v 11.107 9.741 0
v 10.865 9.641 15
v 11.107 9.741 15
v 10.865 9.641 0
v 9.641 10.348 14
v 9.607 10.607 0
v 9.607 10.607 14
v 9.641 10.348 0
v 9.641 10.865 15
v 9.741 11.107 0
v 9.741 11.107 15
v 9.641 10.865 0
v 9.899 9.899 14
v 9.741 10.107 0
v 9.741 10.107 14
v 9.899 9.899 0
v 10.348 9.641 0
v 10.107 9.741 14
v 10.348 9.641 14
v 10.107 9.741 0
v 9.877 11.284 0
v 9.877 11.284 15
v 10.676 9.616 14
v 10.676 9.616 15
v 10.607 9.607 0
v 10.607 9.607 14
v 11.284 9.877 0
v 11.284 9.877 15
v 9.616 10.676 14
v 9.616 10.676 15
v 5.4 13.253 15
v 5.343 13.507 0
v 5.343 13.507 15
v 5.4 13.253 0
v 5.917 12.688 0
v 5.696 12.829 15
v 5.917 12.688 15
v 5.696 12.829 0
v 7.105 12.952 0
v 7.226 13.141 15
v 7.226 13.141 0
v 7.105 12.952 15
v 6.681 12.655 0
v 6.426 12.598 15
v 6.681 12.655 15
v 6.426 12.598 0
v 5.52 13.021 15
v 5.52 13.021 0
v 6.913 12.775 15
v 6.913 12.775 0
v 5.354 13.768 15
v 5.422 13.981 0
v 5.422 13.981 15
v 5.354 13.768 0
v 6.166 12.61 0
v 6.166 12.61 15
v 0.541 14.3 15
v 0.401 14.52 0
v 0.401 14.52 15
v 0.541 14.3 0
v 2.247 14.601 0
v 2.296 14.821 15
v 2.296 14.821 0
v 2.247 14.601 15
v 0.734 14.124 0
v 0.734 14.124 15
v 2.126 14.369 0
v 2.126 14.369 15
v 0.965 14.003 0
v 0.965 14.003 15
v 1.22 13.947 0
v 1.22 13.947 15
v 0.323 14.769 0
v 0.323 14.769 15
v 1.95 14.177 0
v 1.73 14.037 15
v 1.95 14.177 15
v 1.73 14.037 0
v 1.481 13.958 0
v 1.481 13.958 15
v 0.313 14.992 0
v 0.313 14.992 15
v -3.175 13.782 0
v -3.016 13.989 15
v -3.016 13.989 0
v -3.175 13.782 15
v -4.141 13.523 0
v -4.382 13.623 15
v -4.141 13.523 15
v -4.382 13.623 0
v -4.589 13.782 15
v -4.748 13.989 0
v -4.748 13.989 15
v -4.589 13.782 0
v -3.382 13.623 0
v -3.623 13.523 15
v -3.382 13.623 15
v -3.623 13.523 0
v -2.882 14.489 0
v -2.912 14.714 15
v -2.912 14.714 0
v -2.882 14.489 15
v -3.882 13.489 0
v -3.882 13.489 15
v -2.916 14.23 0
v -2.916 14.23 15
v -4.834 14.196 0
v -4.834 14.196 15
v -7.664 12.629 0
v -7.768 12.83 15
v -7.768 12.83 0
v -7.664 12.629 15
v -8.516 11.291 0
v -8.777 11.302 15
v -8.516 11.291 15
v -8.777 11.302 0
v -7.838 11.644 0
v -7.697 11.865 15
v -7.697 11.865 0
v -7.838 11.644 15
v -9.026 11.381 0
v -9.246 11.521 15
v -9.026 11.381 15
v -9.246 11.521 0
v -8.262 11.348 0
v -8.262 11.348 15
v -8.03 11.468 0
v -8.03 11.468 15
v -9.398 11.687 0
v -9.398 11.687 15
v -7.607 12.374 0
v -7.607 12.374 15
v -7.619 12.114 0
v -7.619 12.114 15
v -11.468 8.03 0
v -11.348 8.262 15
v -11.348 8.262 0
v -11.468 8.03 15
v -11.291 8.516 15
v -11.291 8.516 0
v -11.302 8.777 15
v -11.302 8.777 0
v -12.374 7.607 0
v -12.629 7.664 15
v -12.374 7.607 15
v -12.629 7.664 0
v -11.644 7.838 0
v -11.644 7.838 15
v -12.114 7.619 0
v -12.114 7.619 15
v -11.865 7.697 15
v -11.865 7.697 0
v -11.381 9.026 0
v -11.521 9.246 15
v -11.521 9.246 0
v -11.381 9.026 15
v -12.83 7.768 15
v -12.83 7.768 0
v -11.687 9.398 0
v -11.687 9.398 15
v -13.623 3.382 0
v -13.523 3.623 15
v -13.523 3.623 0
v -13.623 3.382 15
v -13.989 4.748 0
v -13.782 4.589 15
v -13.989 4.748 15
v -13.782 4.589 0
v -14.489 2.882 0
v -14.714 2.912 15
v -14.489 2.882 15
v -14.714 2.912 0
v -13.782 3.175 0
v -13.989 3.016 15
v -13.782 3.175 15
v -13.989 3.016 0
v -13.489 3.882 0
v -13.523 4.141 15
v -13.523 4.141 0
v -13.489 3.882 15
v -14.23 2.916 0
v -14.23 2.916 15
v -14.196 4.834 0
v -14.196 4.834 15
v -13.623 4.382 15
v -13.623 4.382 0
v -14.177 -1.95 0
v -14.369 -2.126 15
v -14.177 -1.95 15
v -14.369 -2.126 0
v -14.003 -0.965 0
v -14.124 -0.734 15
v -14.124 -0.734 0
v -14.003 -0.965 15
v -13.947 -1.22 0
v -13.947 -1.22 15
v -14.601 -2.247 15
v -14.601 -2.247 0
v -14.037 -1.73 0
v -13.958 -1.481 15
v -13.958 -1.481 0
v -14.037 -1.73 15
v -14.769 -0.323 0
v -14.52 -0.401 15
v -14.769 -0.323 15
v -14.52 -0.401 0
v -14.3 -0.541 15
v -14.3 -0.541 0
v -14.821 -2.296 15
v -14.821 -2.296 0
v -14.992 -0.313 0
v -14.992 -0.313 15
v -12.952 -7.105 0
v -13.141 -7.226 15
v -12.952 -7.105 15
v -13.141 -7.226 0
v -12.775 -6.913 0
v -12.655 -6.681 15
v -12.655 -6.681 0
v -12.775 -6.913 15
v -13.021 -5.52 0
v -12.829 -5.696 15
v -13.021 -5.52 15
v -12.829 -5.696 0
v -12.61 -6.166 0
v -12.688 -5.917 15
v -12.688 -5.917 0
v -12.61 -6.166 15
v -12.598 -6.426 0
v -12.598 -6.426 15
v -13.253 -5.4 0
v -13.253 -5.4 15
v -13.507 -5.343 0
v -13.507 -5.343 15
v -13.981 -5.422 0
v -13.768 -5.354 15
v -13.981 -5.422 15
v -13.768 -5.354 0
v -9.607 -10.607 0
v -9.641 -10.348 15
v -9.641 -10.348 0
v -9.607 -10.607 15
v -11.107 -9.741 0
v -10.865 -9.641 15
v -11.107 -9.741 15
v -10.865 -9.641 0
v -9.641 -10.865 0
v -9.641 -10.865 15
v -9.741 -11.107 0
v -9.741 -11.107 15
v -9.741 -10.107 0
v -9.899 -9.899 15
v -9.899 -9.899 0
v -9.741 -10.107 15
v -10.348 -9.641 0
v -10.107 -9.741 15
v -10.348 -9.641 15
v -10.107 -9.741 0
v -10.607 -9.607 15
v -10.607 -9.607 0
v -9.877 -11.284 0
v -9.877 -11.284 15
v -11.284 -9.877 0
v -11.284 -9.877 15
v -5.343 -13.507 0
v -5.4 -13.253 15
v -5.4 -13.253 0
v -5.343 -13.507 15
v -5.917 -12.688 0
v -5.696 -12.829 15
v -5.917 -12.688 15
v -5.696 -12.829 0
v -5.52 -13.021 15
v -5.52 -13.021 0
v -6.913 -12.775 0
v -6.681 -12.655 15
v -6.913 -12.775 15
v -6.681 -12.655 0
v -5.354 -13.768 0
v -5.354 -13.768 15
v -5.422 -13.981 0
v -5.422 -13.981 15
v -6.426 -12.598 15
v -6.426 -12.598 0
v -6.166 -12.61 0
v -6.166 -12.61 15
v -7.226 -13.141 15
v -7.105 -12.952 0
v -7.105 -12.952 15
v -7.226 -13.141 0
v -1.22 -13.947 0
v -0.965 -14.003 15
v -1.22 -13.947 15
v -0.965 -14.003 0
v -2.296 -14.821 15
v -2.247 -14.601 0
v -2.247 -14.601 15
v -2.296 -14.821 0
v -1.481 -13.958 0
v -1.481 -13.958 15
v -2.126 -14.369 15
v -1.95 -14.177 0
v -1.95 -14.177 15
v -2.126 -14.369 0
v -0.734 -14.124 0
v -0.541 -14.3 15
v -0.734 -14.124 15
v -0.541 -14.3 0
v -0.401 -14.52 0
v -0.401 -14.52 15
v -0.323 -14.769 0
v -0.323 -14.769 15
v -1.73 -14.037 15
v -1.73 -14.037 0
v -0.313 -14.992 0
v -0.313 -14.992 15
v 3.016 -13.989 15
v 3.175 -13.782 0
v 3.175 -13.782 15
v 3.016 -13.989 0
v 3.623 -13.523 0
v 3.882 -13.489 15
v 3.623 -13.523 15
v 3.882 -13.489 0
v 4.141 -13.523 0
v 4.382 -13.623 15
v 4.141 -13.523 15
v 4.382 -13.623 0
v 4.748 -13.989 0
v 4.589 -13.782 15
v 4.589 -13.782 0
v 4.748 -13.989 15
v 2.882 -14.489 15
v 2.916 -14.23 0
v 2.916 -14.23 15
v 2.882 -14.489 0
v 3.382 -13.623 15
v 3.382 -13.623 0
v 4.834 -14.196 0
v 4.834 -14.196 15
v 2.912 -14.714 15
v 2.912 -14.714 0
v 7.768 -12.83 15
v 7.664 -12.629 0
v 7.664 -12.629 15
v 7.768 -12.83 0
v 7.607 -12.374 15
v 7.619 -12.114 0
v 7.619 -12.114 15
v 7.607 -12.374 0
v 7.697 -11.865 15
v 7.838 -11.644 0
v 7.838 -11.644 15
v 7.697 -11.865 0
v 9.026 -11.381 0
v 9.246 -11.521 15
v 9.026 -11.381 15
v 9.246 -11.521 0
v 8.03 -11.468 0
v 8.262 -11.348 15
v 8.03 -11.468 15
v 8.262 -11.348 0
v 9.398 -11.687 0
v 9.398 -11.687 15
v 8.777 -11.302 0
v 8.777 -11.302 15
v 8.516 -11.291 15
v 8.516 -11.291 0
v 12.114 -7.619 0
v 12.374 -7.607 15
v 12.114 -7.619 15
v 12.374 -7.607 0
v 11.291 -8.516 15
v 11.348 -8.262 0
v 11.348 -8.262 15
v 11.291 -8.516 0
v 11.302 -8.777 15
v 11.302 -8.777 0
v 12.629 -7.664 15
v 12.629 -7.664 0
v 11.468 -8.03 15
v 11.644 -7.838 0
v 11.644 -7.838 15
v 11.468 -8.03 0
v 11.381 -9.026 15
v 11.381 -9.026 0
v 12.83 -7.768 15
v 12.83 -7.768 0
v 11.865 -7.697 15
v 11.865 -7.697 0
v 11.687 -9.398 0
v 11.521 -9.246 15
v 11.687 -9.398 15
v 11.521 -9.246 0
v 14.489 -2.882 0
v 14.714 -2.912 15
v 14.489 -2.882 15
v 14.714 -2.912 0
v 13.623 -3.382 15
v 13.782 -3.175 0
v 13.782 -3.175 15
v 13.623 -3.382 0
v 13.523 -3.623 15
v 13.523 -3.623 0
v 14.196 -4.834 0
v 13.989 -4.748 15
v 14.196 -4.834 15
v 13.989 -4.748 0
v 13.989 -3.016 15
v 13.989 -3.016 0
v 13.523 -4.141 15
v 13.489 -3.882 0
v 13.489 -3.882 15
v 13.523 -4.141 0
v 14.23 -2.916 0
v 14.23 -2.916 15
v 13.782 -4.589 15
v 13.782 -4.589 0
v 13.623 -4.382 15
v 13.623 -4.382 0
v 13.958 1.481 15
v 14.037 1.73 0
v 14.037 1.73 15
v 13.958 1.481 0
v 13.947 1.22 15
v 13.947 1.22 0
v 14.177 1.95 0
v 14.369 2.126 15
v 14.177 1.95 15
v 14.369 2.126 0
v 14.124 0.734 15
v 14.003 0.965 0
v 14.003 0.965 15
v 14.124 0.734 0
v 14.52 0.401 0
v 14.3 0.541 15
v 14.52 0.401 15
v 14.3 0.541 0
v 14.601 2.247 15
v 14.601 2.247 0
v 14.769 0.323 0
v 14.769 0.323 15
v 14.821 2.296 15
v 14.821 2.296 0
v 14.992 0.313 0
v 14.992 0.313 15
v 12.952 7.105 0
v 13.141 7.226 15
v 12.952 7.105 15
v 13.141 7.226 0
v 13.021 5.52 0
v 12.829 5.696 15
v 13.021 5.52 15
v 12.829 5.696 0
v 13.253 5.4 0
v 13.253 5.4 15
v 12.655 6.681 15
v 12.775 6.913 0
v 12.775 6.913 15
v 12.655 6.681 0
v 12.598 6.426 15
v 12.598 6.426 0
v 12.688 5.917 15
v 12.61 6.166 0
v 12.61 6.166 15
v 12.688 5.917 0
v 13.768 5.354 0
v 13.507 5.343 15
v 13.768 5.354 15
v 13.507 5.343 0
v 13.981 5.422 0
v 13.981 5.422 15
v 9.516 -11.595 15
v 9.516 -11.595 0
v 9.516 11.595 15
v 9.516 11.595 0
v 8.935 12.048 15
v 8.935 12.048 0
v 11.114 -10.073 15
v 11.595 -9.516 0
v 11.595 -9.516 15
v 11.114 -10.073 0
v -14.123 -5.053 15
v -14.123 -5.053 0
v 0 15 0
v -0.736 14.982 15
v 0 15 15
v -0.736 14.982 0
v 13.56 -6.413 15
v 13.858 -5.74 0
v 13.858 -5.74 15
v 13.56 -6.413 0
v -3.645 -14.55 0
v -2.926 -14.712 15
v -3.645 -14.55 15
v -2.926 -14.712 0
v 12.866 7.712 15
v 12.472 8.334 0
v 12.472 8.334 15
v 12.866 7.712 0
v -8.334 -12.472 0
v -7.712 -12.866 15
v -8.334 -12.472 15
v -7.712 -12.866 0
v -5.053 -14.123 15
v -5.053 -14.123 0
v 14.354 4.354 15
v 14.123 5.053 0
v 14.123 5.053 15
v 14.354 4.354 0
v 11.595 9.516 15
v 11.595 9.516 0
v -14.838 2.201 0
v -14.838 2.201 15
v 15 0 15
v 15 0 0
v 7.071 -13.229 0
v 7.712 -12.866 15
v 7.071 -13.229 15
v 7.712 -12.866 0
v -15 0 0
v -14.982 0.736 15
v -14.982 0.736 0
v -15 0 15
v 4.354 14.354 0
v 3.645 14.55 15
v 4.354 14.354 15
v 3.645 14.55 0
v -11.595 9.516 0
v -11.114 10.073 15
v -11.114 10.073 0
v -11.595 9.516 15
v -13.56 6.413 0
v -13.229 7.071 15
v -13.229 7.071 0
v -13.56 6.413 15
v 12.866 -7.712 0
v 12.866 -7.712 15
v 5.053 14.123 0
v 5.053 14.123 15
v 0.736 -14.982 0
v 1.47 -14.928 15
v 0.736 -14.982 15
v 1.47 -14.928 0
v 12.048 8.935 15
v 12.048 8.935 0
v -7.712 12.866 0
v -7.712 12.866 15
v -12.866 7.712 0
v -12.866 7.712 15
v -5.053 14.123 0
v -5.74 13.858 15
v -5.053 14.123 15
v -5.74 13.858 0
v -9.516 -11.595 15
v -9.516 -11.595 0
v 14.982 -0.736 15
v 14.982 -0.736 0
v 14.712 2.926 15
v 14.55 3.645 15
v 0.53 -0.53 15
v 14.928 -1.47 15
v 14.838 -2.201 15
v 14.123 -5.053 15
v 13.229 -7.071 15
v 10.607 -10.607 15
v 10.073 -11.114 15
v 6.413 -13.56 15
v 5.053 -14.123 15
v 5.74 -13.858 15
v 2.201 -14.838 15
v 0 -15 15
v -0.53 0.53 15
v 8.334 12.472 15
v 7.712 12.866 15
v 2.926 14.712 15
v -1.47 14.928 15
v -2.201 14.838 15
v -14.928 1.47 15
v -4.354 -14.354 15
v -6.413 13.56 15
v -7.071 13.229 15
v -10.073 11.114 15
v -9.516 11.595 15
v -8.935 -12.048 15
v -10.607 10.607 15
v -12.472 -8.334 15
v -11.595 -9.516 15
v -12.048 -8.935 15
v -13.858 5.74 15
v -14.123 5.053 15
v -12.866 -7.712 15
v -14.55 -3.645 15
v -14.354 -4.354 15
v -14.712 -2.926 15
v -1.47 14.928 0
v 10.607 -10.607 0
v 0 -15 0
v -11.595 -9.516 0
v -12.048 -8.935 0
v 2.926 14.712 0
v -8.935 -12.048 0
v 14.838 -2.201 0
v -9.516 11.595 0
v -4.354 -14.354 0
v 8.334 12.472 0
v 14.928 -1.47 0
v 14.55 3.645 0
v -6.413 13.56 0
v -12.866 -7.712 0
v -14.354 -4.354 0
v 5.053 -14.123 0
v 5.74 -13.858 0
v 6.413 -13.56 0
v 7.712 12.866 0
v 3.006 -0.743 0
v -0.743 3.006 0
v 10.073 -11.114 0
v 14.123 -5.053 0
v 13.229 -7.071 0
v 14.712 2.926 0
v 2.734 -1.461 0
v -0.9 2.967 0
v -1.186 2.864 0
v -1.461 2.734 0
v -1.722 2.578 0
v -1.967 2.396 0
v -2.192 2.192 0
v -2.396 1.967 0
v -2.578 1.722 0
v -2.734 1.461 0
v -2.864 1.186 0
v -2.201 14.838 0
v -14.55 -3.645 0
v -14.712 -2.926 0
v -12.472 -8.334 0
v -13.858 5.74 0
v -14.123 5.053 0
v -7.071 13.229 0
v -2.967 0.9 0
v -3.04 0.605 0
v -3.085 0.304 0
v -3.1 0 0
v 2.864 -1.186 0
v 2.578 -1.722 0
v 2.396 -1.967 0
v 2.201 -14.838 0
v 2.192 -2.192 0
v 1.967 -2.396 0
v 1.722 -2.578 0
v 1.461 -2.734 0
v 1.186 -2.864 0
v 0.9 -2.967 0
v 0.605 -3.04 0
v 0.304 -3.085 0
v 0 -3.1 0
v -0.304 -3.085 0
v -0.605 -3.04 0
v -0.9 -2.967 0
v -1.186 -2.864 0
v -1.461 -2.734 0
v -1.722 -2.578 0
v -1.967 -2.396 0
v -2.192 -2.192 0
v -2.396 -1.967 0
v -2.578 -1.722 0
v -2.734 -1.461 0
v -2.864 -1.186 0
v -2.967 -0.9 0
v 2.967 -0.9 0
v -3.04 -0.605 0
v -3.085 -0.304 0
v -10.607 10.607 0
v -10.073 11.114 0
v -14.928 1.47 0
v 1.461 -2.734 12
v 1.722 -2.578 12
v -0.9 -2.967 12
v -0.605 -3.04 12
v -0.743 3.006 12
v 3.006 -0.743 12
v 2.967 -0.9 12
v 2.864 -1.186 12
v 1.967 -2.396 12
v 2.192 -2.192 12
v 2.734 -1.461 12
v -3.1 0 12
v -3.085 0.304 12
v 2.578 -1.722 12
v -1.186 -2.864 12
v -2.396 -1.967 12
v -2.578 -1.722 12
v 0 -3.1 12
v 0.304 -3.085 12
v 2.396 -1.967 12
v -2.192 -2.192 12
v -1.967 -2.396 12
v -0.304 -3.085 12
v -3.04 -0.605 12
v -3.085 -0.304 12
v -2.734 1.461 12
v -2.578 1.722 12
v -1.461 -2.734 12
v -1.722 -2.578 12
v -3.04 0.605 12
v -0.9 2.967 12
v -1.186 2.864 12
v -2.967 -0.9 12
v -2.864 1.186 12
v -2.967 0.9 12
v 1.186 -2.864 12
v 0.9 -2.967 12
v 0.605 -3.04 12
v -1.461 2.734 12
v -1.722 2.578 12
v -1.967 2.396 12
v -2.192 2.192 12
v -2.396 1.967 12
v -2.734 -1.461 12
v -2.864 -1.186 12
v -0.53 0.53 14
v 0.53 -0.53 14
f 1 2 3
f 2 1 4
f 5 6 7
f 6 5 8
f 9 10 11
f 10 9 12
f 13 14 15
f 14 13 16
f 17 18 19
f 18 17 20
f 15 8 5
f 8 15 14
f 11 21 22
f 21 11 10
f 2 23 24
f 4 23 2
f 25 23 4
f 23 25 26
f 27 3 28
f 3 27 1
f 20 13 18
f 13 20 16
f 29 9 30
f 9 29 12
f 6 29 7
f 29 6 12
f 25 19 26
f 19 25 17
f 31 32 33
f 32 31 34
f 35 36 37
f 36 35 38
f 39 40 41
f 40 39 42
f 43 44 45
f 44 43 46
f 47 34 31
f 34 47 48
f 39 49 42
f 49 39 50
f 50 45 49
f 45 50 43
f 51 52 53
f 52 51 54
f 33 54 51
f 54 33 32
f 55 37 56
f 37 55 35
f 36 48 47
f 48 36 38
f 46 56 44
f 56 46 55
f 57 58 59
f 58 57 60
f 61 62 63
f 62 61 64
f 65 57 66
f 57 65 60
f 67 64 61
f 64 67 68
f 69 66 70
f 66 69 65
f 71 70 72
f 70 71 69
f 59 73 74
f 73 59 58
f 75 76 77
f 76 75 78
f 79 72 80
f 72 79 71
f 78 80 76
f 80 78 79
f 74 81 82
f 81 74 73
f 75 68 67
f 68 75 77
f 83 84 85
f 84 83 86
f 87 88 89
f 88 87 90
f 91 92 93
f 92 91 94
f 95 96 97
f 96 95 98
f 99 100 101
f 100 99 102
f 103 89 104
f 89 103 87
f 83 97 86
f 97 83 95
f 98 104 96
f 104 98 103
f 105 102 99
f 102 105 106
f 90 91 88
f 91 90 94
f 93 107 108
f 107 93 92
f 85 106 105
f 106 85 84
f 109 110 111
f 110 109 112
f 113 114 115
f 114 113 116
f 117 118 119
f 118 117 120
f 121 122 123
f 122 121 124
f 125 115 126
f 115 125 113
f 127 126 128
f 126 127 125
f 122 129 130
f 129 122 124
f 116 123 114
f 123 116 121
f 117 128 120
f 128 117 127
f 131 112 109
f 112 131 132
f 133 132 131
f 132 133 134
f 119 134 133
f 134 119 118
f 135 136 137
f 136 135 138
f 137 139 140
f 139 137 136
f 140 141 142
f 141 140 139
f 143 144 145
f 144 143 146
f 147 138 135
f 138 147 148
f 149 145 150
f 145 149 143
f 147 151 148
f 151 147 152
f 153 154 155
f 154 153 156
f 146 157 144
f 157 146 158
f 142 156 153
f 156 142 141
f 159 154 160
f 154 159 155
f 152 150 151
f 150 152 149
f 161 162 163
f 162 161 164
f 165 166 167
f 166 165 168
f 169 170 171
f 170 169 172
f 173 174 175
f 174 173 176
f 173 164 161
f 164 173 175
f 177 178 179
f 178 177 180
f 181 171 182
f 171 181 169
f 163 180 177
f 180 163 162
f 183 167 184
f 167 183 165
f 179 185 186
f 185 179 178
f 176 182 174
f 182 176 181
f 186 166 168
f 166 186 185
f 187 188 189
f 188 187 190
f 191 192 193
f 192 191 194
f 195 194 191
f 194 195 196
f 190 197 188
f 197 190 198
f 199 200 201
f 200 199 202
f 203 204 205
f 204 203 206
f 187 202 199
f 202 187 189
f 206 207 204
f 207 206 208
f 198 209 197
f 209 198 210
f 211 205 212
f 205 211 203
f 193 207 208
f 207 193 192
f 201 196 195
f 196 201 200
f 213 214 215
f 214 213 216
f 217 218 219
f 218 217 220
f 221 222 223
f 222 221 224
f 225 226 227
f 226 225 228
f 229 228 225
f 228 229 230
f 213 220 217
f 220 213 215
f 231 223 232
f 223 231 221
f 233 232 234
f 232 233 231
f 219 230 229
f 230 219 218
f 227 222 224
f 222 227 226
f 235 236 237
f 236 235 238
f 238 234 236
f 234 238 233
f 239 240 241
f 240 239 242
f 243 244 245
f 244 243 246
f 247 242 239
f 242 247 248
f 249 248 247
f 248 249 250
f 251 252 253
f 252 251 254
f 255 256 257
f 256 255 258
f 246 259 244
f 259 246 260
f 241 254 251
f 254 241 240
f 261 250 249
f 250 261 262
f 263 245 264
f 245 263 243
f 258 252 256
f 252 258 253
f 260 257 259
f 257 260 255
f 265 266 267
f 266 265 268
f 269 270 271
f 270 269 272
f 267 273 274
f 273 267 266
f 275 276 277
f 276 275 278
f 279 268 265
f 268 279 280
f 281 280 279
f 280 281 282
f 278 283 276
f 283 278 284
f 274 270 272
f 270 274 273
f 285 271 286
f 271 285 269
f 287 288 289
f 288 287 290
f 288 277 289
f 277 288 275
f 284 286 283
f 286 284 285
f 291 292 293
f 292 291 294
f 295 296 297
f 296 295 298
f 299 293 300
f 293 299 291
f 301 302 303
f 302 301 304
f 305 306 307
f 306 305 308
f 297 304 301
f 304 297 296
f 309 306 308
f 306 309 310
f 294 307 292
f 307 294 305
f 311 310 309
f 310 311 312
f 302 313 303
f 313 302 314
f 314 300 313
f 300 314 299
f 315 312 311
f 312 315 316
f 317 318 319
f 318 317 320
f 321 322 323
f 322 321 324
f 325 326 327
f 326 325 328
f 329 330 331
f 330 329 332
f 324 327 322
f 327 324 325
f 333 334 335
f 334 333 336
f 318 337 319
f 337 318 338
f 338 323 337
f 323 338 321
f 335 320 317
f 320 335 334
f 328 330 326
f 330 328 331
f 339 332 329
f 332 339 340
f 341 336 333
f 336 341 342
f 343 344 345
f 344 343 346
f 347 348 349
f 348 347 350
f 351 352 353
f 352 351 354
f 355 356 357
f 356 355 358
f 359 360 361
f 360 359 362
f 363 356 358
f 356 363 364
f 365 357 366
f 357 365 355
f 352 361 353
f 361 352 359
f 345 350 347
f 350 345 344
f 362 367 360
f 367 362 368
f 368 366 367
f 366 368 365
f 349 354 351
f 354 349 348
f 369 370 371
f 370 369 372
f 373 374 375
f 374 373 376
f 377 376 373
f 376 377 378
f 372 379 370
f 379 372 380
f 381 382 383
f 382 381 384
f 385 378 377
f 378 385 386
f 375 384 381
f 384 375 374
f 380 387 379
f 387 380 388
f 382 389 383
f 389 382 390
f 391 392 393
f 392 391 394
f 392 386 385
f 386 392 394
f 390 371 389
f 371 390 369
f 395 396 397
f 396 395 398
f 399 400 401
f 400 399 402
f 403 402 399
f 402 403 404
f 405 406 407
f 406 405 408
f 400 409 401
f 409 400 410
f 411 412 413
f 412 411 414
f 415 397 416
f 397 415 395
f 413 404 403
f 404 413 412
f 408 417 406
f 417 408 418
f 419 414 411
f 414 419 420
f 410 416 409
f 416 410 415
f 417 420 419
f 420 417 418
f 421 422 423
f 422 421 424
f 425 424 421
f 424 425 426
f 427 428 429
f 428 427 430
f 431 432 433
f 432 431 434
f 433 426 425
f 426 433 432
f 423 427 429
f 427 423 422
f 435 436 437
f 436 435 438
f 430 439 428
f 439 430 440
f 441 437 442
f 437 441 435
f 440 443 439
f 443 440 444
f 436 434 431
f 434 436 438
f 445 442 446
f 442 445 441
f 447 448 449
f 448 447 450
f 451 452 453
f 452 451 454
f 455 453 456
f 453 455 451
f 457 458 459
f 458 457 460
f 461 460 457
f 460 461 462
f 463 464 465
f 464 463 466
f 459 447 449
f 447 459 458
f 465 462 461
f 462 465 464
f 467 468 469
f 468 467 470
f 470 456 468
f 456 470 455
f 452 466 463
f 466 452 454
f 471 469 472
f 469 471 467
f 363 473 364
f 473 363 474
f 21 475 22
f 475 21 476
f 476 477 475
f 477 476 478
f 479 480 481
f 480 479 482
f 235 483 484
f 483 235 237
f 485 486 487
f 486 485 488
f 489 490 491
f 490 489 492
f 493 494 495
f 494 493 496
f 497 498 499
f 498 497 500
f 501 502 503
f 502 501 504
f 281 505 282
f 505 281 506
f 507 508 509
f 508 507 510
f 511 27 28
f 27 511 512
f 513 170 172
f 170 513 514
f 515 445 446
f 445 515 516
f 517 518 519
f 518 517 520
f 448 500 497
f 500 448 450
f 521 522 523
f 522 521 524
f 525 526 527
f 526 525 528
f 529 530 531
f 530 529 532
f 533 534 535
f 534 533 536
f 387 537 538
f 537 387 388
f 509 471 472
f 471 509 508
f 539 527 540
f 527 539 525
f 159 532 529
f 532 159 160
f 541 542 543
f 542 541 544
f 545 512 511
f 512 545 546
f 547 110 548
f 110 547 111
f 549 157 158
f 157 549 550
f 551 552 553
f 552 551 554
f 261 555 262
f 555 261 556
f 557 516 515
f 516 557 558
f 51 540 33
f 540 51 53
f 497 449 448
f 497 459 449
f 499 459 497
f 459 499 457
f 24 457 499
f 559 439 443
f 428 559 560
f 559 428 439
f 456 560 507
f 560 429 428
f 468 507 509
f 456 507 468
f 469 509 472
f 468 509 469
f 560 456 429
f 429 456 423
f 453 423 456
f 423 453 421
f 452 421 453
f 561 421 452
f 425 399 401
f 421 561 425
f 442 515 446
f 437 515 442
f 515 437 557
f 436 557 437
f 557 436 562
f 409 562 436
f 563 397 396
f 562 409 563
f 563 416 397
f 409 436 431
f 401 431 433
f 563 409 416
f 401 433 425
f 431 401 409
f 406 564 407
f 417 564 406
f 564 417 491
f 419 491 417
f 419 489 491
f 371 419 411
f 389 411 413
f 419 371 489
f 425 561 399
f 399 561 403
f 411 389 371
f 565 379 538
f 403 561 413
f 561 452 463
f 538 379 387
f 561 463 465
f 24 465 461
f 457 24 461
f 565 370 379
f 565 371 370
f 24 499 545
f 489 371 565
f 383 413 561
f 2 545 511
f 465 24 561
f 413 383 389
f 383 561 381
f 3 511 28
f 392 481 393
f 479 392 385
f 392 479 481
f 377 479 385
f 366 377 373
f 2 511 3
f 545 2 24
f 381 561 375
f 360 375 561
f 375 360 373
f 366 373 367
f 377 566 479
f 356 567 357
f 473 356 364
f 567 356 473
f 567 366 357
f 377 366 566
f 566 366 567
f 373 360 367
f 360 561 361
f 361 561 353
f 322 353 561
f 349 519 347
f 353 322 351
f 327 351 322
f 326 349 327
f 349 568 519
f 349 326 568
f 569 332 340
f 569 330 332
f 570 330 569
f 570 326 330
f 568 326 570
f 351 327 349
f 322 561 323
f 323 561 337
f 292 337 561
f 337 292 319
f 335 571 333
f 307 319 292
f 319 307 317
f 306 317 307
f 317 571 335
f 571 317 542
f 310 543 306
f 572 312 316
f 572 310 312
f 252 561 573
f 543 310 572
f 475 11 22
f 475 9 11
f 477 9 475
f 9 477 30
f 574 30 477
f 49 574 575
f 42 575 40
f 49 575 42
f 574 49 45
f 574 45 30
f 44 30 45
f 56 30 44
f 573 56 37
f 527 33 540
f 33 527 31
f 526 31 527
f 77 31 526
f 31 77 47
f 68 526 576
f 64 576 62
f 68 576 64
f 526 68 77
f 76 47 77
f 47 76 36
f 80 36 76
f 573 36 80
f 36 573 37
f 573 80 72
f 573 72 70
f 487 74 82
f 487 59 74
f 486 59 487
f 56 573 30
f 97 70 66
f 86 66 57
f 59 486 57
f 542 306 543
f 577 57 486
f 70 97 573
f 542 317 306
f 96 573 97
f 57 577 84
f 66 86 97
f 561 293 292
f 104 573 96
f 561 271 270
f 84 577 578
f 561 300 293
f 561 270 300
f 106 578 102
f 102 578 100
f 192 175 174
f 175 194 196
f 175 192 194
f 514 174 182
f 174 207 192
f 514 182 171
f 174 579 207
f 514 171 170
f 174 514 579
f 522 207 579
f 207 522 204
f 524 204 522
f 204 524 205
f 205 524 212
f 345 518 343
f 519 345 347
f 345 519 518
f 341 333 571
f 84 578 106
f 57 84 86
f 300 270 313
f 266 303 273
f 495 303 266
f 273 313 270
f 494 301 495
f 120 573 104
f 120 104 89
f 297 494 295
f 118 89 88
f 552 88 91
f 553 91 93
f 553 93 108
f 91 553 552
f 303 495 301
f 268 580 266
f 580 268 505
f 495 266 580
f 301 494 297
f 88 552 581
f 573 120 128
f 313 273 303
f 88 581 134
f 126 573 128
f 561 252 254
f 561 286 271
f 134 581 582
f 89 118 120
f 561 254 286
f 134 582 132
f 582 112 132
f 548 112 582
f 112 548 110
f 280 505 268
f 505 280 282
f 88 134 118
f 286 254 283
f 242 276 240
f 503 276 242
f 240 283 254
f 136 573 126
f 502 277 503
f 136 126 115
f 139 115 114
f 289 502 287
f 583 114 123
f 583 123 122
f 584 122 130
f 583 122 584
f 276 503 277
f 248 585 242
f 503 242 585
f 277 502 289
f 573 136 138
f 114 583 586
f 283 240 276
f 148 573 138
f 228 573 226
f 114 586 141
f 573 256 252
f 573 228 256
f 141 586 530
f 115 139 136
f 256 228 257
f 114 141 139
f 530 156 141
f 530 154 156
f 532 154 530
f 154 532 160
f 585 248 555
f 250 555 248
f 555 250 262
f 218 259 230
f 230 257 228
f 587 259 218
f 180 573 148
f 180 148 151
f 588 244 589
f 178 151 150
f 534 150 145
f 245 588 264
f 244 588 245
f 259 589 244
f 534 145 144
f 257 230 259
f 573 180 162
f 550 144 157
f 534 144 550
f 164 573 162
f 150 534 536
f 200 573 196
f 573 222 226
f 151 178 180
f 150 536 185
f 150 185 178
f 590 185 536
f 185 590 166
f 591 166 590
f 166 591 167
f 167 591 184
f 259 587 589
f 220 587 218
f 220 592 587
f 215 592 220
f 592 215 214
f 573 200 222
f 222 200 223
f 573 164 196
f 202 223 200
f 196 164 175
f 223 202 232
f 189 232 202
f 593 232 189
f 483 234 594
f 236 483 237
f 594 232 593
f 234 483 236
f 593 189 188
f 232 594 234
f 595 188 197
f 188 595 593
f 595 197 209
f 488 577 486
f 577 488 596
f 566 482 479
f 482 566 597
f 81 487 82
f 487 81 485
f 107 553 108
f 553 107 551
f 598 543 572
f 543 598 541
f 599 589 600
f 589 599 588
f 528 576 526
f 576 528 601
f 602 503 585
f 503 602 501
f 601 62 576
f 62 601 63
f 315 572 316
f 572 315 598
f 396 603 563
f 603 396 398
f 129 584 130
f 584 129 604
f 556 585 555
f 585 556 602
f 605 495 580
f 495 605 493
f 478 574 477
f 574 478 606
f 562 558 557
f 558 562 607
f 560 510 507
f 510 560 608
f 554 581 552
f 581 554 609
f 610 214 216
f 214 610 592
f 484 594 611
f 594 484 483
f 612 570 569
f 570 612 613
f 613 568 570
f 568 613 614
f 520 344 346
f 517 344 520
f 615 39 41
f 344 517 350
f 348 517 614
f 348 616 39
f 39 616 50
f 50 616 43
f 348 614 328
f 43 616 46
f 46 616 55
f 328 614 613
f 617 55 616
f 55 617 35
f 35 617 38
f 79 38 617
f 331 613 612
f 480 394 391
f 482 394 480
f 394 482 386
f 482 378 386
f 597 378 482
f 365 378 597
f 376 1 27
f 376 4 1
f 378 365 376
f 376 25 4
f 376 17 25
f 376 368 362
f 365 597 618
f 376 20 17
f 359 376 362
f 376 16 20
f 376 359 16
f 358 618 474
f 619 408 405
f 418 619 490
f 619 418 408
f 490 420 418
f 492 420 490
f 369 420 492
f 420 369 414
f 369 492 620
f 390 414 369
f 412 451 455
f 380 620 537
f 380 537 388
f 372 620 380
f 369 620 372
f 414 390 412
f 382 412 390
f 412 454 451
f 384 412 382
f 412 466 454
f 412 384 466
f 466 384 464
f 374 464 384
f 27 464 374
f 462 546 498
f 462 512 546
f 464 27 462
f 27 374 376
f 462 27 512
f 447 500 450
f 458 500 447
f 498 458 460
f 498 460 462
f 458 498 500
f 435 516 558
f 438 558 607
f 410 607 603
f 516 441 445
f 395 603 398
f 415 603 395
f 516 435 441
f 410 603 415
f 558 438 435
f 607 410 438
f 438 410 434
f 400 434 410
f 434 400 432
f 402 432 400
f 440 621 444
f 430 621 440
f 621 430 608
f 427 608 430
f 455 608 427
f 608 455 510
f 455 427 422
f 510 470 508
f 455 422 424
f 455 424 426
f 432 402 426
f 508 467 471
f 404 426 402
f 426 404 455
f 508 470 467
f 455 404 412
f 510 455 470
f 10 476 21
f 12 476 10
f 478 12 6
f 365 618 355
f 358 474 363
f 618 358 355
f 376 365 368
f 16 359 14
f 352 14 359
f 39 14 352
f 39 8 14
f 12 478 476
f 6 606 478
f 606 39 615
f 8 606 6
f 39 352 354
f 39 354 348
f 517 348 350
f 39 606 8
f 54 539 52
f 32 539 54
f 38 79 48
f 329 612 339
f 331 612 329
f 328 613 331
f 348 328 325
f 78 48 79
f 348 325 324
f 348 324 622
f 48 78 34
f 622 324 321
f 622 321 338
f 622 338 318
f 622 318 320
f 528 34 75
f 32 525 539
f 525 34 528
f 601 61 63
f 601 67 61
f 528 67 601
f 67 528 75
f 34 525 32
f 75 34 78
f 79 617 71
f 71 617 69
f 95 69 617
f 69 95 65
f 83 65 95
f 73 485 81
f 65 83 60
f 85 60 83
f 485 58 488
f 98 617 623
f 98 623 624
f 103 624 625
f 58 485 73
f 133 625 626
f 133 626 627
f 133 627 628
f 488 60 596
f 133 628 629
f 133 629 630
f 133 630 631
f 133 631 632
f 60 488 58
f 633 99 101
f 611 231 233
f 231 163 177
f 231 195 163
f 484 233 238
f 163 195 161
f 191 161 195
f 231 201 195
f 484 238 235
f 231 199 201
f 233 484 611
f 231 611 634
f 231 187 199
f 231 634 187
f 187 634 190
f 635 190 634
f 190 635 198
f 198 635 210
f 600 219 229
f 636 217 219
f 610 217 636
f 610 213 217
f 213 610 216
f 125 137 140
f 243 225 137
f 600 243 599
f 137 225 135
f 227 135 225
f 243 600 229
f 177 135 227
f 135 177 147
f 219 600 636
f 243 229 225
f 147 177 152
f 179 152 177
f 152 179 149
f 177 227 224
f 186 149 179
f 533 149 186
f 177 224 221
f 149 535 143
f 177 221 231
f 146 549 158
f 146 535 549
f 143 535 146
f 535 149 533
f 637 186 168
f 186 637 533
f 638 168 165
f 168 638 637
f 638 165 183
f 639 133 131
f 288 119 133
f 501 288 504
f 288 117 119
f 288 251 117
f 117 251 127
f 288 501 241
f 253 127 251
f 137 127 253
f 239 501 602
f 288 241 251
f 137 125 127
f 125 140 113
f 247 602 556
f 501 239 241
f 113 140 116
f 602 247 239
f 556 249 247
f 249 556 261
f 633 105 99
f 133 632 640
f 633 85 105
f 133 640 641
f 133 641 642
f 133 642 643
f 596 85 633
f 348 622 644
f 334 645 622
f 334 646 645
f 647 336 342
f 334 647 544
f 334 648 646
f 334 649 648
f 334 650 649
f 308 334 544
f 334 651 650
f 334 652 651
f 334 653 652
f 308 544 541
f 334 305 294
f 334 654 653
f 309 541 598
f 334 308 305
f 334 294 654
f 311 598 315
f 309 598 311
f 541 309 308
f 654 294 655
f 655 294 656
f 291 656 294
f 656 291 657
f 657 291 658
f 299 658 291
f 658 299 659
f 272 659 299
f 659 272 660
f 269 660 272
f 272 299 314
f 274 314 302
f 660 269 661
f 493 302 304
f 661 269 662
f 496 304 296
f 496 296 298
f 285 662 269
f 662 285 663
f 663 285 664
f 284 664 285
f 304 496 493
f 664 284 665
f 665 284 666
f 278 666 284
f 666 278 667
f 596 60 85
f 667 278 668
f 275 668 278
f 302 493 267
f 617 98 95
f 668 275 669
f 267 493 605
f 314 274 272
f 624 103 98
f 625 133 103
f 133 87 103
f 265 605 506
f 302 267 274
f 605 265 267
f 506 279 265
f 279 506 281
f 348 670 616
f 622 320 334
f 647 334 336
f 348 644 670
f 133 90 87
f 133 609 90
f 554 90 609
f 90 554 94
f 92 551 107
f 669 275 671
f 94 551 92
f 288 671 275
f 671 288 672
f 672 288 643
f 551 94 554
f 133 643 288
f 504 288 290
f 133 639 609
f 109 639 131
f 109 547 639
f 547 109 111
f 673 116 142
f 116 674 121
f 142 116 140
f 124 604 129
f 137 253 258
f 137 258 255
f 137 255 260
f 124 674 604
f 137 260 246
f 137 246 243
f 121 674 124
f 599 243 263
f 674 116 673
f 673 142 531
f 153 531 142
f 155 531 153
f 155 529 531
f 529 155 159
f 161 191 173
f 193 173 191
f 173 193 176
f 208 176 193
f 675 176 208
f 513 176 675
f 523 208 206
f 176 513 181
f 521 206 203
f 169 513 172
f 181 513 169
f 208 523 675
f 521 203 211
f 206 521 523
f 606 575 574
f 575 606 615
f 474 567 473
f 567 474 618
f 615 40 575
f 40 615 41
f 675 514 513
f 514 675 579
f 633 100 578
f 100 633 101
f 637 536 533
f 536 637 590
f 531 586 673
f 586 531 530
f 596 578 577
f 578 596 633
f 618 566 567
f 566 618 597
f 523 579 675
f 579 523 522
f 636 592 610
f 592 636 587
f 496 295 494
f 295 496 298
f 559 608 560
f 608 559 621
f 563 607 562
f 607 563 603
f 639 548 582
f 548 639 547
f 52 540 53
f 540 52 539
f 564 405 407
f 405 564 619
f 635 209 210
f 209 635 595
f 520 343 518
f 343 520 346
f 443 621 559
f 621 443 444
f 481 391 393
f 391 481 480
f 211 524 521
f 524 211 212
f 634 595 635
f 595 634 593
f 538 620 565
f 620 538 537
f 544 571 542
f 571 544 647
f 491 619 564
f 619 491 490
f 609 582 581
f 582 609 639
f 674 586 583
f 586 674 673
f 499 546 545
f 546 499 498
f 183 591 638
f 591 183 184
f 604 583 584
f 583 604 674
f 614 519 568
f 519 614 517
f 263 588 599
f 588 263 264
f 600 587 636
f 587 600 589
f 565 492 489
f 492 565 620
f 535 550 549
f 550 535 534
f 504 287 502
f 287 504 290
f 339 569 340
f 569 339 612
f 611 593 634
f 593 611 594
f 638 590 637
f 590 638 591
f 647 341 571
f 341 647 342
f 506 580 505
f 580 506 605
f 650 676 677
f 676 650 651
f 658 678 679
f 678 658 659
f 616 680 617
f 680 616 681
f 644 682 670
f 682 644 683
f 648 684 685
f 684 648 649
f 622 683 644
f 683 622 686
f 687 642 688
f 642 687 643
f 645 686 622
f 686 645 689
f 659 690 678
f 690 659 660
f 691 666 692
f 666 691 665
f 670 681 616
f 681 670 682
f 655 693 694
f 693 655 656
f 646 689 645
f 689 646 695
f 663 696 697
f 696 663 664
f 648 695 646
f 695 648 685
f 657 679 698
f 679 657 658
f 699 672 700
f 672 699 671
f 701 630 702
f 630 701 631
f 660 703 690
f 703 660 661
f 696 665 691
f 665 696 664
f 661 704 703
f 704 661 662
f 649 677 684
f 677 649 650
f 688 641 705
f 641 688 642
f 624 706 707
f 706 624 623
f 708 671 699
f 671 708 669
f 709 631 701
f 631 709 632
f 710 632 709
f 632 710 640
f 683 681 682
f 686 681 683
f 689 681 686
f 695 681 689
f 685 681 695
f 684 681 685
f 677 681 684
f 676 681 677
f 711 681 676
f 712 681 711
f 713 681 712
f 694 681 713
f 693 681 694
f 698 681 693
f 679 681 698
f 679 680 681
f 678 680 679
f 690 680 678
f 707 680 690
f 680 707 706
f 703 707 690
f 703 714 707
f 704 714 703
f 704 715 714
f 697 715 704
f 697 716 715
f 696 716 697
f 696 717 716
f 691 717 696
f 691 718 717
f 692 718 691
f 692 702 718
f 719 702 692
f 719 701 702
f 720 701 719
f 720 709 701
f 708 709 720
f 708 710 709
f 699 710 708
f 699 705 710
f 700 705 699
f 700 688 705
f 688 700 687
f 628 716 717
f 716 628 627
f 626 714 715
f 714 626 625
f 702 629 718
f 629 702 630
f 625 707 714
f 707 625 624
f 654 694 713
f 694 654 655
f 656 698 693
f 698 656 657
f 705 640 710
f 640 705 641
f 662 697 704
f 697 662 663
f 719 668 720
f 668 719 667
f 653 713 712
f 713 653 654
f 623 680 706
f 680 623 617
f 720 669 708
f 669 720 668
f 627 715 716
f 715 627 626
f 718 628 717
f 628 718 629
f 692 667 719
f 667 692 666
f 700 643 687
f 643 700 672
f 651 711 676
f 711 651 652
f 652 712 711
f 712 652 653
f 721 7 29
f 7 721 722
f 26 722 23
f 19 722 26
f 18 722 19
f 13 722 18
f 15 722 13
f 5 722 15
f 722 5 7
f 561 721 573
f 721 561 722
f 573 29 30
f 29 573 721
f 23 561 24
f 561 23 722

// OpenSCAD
// Replacement knob for a 6 mm D-shaft (hotplates, stirrers, power supplies)
// Category: quick fixes. D-shaped blind bore from the bottom, grip grooves and a
// pointer groove on top that lines up with the flat of the shaft.
// Print: PETG (heat near hotplates), 0.15 mm layers, 4 perimeters, bore face down.
// SPDX-License-Identifier: CERN-OHL-P-2.0

/* [Knob] */
knob_d = 30;
knob_h = 15;
shaft_d = 6.2;         // 6 mm shaft + 0.2 mm clearance
shaft_flat = 4.7;      // flat-to-round distance (4.5 mm nominal + clearance)
bore_depth = 12;
n_grooves = 18;
groove_d = 2;
pointer_w = 1.5;
pointer_depth = 1;

/* [Hidden] */
eps = 0.01;

rotate([0,0,45]) difference() {
    cylinder(d = knob_d, h = knob_h, $fn = 128);
    // D-shaped bore; the flat faces +X
    translate([0, 0, -eps])
        linear_extrude(bore_depth + eps)
            intersection() {
                circle(d = shaft_d, $fn = 64);
                translate([-shaft_d / 2, -shaft_d / 2]) square([shaft_flat, shaft_d]);
            }
    // grip grooves
    for (i = [0 : n_grooves - 1])
        rotate(i * 360 / n_grooves)
            translate([knob_d / 2, 0, -eps]) cylinder(d = groove_d, h = knob_h + 2 * eps, $fn = 24);
    // pointer groove on top, pointing at the flat (+X)
    translate([0, -pointer_w / 2, knob_h - pointer_depth])
        cube([knob_d / 2 + 1, pointer_w, pointer_depth + eps]);
}
